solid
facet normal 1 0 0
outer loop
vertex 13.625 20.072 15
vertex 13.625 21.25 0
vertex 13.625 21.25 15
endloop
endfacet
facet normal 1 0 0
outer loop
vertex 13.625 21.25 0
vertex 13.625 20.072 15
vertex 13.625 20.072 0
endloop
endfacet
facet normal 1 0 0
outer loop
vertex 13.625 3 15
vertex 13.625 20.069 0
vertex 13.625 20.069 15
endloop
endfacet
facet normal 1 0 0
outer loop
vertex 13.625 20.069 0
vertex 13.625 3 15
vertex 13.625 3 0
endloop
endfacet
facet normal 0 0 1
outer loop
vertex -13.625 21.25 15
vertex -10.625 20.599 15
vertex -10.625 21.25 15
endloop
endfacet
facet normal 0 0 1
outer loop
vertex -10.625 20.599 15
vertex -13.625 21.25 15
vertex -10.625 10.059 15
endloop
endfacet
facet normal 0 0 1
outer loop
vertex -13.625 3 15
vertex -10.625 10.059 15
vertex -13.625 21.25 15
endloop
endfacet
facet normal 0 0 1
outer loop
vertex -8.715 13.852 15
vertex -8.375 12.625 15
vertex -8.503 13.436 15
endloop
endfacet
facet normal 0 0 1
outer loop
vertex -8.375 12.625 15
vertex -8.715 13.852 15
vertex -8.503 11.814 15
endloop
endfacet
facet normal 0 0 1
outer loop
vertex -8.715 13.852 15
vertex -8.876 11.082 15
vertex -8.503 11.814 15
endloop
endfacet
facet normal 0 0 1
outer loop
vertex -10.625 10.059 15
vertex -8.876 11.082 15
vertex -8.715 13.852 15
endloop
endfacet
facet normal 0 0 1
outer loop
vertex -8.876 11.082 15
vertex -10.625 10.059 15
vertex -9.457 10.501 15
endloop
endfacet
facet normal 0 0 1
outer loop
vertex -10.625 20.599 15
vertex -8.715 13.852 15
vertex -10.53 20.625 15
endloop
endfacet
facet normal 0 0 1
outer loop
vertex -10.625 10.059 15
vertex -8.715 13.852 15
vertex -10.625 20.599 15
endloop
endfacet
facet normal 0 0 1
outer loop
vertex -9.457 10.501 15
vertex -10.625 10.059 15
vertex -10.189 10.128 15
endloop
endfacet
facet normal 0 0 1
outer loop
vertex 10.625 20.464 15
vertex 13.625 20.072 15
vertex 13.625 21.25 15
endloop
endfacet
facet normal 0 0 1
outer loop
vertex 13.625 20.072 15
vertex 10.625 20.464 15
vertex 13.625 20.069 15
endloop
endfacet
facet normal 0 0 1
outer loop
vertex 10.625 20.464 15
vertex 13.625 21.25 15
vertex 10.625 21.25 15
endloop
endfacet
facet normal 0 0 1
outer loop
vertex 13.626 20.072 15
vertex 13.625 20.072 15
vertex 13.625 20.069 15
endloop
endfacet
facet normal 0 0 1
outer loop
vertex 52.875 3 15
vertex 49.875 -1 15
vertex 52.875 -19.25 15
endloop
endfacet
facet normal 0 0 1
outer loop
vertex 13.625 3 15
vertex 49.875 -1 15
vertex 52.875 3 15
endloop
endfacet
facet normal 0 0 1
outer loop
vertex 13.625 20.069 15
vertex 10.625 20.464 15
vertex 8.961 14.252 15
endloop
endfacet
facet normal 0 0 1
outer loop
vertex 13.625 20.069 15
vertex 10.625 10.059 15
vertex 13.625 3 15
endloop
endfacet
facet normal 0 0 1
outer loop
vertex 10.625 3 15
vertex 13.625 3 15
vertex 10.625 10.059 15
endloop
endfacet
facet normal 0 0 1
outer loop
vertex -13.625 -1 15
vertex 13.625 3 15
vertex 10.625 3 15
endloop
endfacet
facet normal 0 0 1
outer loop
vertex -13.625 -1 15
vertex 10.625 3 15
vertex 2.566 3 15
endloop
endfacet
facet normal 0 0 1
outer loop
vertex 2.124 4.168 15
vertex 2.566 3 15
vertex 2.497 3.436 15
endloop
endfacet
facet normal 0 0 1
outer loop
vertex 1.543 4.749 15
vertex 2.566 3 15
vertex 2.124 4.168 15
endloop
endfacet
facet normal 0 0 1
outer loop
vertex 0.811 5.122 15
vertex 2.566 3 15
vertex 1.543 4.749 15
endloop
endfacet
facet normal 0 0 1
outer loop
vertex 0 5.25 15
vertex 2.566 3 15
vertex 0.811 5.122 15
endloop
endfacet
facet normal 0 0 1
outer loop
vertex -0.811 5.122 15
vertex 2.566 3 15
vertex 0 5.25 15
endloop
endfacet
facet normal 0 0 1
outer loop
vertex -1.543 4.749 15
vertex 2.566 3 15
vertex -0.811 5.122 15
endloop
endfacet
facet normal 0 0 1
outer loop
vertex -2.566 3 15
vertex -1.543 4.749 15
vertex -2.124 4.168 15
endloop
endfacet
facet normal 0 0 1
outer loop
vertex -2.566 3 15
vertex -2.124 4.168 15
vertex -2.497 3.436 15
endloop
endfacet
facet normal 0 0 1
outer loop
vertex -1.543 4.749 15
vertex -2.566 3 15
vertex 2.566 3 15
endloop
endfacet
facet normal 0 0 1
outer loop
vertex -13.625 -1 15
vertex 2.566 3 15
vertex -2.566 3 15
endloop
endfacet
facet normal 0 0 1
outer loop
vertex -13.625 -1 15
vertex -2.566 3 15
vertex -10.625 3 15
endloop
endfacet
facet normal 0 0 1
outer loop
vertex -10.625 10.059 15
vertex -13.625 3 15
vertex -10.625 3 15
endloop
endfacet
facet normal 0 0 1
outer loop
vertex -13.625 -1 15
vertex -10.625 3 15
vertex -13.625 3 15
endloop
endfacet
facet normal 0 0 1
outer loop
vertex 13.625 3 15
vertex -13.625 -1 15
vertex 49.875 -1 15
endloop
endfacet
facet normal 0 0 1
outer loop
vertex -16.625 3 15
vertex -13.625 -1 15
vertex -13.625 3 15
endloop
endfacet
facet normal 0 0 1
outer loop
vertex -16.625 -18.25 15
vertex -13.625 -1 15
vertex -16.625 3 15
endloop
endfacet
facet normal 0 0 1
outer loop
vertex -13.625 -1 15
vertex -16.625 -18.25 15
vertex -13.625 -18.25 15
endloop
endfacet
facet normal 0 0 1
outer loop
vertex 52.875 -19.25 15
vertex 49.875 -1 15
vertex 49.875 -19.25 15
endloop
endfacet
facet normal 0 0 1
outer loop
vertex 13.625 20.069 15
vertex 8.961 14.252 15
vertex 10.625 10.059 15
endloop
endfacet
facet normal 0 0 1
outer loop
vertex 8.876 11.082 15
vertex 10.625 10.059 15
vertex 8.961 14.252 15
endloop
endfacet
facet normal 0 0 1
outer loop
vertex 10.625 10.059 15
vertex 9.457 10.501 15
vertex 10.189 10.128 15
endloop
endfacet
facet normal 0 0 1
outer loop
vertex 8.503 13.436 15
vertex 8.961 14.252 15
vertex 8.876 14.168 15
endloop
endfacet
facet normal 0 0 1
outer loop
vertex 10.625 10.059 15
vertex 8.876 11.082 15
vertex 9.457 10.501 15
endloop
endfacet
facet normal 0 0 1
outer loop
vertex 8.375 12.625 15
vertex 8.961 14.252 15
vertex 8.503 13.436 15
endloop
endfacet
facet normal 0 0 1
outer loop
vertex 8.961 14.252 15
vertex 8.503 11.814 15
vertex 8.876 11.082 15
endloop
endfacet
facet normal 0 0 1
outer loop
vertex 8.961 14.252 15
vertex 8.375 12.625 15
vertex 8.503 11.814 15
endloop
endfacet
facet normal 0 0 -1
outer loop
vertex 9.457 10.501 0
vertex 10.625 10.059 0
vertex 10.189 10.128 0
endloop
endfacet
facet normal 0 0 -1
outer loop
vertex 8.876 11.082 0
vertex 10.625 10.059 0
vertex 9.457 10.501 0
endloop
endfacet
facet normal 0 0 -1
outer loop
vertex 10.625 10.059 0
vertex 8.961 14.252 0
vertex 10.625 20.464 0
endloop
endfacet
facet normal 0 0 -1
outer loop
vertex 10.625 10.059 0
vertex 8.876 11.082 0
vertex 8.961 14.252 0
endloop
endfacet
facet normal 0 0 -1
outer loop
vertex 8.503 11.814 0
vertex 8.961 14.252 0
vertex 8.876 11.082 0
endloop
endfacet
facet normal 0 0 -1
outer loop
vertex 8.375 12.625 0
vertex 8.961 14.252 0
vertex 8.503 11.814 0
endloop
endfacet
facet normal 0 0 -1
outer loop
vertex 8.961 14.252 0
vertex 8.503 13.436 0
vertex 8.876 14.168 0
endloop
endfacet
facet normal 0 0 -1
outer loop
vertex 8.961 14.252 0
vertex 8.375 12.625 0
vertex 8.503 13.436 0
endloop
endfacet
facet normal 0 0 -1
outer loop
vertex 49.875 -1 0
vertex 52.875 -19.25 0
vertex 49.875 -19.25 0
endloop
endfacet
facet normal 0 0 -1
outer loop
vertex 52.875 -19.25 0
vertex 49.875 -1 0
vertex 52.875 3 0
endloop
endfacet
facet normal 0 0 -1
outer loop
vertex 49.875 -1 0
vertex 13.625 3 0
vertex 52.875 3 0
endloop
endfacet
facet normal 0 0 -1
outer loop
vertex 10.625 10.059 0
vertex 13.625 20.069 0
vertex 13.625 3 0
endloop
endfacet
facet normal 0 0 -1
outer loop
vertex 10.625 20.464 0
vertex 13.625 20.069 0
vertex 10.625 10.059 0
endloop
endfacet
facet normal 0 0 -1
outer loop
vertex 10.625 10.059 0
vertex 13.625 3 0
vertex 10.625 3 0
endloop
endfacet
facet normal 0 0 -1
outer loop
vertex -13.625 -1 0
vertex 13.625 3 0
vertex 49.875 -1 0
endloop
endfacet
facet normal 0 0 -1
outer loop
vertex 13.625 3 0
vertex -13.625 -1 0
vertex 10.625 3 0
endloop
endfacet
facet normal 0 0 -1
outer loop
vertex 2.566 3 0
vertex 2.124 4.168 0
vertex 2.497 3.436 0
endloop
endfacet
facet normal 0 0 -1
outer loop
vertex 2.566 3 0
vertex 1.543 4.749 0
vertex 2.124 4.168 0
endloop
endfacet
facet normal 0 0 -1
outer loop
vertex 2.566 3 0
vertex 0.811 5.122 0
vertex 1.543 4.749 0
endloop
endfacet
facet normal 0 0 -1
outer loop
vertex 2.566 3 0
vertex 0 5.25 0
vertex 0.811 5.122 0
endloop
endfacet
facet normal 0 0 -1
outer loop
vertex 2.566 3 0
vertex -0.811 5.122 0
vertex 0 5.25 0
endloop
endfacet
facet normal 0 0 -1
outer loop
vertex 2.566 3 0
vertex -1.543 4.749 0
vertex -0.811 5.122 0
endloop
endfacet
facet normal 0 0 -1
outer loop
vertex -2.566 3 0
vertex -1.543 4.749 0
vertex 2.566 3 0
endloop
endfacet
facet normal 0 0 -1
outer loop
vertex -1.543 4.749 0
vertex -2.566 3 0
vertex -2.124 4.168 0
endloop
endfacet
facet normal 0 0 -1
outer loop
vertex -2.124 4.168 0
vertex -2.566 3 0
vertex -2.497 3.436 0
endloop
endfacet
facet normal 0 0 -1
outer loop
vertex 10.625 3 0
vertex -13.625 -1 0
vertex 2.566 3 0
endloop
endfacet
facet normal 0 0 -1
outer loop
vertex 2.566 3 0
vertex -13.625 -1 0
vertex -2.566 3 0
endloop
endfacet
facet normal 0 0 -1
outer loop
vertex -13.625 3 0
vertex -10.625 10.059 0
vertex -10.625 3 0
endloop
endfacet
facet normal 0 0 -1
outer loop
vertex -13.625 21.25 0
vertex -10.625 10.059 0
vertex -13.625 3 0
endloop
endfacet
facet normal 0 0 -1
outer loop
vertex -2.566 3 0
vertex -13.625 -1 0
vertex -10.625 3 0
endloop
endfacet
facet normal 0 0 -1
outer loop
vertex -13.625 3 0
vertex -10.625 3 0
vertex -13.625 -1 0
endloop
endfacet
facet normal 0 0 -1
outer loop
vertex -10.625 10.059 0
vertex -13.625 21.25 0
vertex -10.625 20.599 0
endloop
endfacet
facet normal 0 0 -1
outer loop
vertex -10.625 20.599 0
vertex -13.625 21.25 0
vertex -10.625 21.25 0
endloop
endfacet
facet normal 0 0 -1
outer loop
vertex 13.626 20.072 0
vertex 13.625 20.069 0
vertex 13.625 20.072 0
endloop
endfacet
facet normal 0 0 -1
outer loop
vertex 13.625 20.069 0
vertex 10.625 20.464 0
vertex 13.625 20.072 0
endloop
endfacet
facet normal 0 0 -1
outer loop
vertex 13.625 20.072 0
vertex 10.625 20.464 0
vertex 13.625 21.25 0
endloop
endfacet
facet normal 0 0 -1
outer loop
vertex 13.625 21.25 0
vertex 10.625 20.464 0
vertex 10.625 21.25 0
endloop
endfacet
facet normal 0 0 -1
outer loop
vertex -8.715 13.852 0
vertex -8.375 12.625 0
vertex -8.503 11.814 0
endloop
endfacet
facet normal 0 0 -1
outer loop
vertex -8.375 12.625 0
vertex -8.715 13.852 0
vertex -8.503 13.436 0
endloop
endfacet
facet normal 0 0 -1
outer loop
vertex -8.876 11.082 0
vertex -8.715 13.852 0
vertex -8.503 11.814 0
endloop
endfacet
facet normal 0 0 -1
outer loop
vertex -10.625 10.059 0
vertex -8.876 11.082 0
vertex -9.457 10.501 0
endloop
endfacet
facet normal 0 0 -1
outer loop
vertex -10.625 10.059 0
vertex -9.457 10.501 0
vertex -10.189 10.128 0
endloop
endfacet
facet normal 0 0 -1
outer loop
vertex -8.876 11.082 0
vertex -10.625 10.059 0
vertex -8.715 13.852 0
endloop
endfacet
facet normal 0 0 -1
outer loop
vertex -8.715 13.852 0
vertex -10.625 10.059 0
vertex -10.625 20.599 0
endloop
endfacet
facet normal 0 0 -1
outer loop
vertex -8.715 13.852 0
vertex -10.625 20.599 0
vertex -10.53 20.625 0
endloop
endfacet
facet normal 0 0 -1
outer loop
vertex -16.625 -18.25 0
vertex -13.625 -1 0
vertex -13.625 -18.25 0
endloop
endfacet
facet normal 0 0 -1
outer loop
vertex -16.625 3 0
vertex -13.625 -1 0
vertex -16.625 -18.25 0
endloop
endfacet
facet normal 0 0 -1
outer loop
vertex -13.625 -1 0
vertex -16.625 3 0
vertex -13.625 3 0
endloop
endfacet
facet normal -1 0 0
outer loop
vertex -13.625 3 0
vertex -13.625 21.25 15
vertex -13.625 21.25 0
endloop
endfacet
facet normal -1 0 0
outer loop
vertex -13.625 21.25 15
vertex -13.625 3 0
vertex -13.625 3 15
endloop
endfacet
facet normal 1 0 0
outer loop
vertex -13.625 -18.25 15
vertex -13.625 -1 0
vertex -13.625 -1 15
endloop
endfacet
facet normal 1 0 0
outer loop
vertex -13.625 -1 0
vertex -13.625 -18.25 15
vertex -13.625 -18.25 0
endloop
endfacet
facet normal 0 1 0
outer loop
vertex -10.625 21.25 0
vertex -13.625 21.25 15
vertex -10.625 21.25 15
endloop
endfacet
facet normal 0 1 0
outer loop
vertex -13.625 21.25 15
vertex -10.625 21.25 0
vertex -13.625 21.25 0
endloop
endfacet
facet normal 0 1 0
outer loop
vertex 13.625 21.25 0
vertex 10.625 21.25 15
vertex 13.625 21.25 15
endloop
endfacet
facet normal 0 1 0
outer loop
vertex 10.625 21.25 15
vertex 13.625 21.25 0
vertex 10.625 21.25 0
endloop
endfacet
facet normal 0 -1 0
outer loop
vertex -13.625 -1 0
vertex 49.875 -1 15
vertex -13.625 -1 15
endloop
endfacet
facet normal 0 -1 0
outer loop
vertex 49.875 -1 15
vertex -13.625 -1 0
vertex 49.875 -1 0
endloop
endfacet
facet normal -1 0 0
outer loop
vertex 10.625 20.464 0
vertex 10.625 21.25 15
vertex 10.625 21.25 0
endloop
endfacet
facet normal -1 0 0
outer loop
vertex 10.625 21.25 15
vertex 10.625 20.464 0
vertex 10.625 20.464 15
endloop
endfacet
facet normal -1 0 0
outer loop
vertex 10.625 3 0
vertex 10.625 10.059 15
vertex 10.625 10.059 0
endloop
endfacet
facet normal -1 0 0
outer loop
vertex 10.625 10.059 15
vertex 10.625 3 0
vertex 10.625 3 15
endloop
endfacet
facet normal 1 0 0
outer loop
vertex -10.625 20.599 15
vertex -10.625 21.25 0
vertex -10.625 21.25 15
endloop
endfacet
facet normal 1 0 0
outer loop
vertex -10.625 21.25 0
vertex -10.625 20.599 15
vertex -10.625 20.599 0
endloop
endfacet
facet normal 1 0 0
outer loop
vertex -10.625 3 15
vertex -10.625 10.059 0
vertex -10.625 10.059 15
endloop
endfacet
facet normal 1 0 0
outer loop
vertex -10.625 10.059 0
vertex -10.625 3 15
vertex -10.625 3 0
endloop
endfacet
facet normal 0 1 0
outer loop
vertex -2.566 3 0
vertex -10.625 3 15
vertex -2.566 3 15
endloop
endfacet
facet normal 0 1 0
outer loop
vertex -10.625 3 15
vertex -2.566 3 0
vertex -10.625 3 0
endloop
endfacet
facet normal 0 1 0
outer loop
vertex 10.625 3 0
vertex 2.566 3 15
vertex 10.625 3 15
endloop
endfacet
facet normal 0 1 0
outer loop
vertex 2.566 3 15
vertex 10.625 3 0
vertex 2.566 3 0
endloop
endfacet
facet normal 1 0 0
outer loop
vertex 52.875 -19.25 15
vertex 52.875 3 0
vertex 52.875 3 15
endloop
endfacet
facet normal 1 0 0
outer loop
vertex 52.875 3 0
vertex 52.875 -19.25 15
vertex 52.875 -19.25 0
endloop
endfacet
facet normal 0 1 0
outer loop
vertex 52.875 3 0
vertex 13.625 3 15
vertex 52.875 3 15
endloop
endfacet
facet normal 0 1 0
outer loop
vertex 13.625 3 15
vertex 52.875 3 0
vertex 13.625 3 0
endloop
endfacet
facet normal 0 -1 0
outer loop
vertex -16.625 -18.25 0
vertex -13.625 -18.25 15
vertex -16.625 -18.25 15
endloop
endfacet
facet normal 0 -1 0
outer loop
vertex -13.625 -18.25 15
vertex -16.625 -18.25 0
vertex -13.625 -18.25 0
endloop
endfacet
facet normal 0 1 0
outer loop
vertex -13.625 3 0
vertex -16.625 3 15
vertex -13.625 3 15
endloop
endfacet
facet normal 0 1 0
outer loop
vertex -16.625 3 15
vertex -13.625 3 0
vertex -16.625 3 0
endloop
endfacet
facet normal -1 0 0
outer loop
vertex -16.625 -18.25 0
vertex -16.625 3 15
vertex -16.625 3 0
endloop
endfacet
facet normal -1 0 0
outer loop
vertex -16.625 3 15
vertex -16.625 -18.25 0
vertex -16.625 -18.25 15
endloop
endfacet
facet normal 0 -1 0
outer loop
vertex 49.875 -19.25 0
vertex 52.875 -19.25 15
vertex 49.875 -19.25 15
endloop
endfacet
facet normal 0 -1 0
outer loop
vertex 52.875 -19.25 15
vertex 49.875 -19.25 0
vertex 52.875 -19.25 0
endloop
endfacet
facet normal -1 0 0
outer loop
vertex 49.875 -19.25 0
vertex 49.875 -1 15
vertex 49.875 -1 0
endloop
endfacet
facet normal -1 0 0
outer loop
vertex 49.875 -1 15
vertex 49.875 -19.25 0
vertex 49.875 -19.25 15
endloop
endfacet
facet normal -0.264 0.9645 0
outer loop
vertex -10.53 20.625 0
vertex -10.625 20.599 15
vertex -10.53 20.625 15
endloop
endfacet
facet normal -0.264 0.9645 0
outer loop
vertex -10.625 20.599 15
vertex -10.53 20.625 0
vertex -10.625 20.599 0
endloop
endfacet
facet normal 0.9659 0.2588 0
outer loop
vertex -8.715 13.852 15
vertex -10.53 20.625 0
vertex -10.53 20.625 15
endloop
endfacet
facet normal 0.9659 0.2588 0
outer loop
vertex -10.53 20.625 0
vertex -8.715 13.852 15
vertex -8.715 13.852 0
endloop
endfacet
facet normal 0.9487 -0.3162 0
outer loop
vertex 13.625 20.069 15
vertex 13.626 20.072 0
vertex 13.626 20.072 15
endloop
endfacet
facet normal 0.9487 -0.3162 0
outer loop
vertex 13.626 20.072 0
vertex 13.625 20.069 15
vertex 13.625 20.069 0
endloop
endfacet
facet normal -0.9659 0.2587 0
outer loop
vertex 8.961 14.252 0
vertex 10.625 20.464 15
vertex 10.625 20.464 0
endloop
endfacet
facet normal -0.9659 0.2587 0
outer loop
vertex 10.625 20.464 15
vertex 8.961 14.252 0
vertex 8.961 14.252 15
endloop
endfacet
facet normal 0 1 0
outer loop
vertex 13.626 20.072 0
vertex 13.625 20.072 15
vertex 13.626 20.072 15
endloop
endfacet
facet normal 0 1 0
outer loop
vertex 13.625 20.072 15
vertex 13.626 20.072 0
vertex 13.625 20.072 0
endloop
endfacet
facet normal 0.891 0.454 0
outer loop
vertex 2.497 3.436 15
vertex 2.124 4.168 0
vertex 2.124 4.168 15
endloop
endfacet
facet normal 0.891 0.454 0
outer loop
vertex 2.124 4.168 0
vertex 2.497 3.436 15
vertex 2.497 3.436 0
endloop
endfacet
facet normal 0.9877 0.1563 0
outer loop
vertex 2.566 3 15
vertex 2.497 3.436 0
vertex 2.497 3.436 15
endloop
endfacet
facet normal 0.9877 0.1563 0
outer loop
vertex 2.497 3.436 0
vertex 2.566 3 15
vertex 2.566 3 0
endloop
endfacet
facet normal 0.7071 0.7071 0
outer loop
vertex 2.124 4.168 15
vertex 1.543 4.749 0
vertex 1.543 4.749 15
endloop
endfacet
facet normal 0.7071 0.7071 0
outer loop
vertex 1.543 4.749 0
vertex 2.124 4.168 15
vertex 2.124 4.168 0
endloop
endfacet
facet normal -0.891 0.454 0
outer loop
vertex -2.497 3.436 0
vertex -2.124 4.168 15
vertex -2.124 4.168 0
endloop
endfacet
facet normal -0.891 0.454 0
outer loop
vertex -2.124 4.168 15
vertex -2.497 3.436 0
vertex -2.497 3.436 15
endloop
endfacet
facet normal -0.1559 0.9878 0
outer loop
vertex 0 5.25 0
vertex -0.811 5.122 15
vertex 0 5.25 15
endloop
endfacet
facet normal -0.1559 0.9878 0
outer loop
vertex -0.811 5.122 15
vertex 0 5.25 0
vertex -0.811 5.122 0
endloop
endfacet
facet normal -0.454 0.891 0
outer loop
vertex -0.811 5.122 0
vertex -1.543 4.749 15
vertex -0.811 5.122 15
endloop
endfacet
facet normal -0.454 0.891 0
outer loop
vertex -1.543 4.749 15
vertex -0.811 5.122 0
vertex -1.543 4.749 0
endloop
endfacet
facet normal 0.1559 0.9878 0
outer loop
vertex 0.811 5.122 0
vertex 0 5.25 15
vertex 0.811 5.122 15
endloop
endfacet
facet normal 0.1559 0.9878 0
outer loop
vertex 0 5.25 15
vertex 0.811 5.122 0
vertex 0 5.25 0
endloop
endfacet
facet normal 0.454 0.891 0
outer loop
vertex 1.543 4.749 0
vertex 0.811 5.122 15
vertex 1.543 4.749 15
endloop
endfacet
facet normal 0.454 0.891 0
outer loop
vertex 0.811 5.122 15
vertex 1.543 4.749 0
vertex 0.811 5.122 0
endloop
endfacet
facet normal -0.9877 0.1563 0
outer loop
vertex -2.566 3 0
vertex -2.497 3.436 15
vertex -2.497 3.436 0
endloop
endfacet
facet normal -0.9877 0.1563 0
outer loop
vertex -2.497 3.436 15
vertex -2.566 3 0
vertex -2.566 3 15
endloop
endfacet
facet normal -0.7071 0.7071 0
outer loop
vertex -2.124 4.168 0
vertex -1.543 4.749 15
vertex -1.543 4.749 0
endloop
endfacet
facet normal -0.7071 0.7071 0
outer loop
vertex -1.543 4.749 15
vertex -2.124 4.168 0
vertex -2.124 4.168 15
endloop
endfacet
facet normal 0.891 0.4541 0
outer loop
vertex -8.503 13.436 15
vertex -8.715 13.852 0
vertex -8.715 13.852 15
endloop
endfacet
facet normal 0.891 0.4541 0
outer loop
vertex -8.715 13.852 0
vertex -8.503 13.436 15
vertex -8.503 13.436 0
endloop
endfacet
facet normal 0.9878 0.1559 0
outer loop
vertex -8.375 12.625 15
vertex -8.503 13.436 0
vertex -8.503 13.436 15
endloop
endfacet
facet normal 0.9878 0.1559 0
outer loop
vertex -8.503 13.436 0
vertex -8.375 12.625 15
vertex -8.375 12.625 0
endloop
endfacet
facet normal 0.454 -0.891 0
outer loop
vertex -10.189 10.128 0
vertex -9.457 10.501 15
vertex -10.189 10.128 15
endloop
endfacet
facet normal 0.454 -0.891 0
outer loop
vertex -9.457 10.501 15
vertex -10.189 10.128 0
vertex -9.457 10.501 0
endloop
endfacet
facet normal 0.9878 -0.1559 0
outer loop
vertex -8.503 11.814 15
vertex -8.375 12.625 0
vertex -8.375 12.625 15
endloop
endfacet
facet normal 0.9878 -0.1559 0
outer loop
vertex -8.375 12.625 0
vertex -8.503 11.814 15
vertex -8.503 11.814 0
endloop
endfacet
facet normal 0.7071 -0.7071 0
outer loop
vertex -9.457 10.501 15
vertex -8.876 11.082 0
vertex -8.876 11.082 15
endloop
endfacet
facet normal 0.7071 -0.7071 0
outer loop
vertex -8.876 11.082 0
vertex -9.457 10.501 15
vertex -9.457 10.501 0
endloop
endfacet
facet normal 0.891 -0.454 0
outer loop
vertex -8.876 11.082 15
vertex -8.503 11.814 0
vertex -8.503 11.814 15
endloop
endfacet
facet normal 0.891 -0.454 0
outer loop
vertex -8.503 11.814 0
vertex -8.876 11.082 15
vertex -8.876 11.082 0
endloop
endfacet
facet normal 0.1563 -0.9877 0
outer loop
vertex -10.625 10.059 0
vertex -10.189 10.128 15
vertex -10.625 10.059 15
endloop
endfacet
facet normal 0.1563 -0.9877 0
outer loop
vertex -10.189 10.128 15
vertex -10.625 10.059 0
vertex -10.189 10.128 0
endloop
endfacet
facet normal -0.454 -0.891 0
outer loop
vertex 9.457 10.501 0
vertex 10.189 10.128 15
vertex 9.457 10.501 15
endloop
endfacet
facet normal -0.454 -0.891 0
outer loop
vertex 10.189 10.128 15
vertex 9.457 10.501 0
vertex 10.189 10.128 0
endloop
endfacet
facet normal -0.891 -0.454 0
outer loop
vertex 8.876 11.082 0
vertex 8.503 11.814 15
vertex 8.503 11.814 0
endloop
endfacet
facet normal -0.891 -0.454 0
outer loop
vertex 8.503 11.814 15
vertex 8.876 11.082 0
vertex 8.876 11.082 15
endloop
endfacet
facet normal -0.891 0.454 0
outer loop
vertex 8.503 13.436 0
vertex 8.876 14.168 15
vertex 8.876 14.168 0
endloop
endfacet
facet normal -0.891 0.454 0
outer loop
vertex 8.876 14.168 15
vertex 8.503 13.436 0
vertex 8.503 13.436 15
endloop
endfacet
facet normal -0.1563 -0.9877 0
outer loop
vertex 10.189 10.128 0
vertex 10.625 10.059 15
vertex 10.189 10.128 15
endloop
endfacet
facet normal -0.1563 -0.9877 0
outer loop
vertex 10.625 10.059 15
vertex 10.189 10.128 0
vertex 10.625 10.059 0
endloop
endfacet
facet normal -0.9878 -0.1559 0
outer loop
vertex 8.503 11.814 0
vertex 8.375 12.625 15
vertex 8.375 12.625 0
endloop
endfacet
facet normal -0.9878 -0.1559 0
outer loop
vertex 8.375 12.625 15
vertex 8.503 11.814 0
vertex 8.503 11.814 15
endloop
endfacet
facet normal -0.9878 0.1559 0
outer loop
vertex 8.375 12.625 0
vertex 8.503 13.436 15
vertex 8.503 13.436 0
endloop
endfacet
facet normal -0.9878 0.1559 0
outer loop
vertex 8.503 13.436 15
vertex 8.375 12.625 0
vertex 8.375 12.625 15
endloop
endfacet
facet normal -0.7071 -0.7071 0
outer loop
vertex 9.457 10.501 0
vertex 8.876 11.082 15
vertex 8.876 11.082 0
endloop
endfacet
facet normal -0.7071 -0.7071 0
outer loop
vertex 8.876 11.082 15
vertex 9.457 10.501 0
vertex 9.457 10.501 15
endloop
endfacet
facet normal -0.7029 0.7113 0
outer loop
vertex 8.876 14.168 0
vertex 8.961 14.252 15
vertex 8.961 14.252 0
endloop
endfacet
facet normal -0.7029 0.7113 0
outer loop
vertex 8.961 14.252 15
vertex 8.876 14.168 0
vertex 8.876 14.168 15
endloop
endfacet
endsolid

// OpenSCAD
// nischi 
// mendel max clip

breite = 27.25;
tiefe  = 22.25;
hoehe  = 15.00;
rpi_platform = 69.5;


dicke1 = 3.0;
dicke2 = 3.6;

misumi = 20.00;    
misumi_hole = 5.25;

// lochtiefe  7.00
// lochbreite 5.25

translate([0,0,0]) rotate([0,0,0]) tool_clip();

module tool_clip()
{
  difference()
  {
    union()
    {
        color("blue") translate([-breite/2,-1,0]) cube([breite,tiefe,hoehe]);  
    }

    union()
    {
       color("blue") translate([-breite/2+dicke1,dicke1,-1]) 
       cube([breite-2*dicke1,tiefe,hoehe*2]);
           // cylinder(20, r=5/2,$fn=20);
    }
  }
  //rpi platform
  translate([breite/2,-1,0])
  cube([rpi_platform-breite-dicke1, dicke1+1,hoehe]);
  
  //short support
  translate([-breite/2-dicke1,3,0])
  rotate([0,0,-90])
  cube([breite-2*dicke1,3,hoehe]);
  
  //platform support
  translate([rpi_platform-breite/2-dicke1*2,dicke1-1,0])
  rotate([0,0,-90])
  cube([breite-2*dicke1, dicke1,hoehe]);

  color("lightblue") translate([-breite/2+2.3,misumi/2+2,0]) 
  rotate([0,0,15]) cube([3,tiefe/2-3,hoehe]);  

  color("lightblue") translate([+breite/2-5,misumi/2+3,0]) 
  rotate([0,0,-15]) cube([3,tiefe/2-3,hoehe]);

  color("red")  translate([0,misumi_hole/2,0]) cylinder(hoehe, r=misumi_hole/2,$fn=20);

  color("orange")  translate([-breite/2+misumi_hole/2,misumi_hole/2+misumi/2,0]) 
  cylinder(hoehe, r=misumi_hole/2,$fn=20);
  color("orange")  translate([ breite/2-misumi_hole/2,misumi_hole/2+misumi/2,0]) 
  cylinder(hoehe, r=misumi_hole/2,$fn=20);
}
